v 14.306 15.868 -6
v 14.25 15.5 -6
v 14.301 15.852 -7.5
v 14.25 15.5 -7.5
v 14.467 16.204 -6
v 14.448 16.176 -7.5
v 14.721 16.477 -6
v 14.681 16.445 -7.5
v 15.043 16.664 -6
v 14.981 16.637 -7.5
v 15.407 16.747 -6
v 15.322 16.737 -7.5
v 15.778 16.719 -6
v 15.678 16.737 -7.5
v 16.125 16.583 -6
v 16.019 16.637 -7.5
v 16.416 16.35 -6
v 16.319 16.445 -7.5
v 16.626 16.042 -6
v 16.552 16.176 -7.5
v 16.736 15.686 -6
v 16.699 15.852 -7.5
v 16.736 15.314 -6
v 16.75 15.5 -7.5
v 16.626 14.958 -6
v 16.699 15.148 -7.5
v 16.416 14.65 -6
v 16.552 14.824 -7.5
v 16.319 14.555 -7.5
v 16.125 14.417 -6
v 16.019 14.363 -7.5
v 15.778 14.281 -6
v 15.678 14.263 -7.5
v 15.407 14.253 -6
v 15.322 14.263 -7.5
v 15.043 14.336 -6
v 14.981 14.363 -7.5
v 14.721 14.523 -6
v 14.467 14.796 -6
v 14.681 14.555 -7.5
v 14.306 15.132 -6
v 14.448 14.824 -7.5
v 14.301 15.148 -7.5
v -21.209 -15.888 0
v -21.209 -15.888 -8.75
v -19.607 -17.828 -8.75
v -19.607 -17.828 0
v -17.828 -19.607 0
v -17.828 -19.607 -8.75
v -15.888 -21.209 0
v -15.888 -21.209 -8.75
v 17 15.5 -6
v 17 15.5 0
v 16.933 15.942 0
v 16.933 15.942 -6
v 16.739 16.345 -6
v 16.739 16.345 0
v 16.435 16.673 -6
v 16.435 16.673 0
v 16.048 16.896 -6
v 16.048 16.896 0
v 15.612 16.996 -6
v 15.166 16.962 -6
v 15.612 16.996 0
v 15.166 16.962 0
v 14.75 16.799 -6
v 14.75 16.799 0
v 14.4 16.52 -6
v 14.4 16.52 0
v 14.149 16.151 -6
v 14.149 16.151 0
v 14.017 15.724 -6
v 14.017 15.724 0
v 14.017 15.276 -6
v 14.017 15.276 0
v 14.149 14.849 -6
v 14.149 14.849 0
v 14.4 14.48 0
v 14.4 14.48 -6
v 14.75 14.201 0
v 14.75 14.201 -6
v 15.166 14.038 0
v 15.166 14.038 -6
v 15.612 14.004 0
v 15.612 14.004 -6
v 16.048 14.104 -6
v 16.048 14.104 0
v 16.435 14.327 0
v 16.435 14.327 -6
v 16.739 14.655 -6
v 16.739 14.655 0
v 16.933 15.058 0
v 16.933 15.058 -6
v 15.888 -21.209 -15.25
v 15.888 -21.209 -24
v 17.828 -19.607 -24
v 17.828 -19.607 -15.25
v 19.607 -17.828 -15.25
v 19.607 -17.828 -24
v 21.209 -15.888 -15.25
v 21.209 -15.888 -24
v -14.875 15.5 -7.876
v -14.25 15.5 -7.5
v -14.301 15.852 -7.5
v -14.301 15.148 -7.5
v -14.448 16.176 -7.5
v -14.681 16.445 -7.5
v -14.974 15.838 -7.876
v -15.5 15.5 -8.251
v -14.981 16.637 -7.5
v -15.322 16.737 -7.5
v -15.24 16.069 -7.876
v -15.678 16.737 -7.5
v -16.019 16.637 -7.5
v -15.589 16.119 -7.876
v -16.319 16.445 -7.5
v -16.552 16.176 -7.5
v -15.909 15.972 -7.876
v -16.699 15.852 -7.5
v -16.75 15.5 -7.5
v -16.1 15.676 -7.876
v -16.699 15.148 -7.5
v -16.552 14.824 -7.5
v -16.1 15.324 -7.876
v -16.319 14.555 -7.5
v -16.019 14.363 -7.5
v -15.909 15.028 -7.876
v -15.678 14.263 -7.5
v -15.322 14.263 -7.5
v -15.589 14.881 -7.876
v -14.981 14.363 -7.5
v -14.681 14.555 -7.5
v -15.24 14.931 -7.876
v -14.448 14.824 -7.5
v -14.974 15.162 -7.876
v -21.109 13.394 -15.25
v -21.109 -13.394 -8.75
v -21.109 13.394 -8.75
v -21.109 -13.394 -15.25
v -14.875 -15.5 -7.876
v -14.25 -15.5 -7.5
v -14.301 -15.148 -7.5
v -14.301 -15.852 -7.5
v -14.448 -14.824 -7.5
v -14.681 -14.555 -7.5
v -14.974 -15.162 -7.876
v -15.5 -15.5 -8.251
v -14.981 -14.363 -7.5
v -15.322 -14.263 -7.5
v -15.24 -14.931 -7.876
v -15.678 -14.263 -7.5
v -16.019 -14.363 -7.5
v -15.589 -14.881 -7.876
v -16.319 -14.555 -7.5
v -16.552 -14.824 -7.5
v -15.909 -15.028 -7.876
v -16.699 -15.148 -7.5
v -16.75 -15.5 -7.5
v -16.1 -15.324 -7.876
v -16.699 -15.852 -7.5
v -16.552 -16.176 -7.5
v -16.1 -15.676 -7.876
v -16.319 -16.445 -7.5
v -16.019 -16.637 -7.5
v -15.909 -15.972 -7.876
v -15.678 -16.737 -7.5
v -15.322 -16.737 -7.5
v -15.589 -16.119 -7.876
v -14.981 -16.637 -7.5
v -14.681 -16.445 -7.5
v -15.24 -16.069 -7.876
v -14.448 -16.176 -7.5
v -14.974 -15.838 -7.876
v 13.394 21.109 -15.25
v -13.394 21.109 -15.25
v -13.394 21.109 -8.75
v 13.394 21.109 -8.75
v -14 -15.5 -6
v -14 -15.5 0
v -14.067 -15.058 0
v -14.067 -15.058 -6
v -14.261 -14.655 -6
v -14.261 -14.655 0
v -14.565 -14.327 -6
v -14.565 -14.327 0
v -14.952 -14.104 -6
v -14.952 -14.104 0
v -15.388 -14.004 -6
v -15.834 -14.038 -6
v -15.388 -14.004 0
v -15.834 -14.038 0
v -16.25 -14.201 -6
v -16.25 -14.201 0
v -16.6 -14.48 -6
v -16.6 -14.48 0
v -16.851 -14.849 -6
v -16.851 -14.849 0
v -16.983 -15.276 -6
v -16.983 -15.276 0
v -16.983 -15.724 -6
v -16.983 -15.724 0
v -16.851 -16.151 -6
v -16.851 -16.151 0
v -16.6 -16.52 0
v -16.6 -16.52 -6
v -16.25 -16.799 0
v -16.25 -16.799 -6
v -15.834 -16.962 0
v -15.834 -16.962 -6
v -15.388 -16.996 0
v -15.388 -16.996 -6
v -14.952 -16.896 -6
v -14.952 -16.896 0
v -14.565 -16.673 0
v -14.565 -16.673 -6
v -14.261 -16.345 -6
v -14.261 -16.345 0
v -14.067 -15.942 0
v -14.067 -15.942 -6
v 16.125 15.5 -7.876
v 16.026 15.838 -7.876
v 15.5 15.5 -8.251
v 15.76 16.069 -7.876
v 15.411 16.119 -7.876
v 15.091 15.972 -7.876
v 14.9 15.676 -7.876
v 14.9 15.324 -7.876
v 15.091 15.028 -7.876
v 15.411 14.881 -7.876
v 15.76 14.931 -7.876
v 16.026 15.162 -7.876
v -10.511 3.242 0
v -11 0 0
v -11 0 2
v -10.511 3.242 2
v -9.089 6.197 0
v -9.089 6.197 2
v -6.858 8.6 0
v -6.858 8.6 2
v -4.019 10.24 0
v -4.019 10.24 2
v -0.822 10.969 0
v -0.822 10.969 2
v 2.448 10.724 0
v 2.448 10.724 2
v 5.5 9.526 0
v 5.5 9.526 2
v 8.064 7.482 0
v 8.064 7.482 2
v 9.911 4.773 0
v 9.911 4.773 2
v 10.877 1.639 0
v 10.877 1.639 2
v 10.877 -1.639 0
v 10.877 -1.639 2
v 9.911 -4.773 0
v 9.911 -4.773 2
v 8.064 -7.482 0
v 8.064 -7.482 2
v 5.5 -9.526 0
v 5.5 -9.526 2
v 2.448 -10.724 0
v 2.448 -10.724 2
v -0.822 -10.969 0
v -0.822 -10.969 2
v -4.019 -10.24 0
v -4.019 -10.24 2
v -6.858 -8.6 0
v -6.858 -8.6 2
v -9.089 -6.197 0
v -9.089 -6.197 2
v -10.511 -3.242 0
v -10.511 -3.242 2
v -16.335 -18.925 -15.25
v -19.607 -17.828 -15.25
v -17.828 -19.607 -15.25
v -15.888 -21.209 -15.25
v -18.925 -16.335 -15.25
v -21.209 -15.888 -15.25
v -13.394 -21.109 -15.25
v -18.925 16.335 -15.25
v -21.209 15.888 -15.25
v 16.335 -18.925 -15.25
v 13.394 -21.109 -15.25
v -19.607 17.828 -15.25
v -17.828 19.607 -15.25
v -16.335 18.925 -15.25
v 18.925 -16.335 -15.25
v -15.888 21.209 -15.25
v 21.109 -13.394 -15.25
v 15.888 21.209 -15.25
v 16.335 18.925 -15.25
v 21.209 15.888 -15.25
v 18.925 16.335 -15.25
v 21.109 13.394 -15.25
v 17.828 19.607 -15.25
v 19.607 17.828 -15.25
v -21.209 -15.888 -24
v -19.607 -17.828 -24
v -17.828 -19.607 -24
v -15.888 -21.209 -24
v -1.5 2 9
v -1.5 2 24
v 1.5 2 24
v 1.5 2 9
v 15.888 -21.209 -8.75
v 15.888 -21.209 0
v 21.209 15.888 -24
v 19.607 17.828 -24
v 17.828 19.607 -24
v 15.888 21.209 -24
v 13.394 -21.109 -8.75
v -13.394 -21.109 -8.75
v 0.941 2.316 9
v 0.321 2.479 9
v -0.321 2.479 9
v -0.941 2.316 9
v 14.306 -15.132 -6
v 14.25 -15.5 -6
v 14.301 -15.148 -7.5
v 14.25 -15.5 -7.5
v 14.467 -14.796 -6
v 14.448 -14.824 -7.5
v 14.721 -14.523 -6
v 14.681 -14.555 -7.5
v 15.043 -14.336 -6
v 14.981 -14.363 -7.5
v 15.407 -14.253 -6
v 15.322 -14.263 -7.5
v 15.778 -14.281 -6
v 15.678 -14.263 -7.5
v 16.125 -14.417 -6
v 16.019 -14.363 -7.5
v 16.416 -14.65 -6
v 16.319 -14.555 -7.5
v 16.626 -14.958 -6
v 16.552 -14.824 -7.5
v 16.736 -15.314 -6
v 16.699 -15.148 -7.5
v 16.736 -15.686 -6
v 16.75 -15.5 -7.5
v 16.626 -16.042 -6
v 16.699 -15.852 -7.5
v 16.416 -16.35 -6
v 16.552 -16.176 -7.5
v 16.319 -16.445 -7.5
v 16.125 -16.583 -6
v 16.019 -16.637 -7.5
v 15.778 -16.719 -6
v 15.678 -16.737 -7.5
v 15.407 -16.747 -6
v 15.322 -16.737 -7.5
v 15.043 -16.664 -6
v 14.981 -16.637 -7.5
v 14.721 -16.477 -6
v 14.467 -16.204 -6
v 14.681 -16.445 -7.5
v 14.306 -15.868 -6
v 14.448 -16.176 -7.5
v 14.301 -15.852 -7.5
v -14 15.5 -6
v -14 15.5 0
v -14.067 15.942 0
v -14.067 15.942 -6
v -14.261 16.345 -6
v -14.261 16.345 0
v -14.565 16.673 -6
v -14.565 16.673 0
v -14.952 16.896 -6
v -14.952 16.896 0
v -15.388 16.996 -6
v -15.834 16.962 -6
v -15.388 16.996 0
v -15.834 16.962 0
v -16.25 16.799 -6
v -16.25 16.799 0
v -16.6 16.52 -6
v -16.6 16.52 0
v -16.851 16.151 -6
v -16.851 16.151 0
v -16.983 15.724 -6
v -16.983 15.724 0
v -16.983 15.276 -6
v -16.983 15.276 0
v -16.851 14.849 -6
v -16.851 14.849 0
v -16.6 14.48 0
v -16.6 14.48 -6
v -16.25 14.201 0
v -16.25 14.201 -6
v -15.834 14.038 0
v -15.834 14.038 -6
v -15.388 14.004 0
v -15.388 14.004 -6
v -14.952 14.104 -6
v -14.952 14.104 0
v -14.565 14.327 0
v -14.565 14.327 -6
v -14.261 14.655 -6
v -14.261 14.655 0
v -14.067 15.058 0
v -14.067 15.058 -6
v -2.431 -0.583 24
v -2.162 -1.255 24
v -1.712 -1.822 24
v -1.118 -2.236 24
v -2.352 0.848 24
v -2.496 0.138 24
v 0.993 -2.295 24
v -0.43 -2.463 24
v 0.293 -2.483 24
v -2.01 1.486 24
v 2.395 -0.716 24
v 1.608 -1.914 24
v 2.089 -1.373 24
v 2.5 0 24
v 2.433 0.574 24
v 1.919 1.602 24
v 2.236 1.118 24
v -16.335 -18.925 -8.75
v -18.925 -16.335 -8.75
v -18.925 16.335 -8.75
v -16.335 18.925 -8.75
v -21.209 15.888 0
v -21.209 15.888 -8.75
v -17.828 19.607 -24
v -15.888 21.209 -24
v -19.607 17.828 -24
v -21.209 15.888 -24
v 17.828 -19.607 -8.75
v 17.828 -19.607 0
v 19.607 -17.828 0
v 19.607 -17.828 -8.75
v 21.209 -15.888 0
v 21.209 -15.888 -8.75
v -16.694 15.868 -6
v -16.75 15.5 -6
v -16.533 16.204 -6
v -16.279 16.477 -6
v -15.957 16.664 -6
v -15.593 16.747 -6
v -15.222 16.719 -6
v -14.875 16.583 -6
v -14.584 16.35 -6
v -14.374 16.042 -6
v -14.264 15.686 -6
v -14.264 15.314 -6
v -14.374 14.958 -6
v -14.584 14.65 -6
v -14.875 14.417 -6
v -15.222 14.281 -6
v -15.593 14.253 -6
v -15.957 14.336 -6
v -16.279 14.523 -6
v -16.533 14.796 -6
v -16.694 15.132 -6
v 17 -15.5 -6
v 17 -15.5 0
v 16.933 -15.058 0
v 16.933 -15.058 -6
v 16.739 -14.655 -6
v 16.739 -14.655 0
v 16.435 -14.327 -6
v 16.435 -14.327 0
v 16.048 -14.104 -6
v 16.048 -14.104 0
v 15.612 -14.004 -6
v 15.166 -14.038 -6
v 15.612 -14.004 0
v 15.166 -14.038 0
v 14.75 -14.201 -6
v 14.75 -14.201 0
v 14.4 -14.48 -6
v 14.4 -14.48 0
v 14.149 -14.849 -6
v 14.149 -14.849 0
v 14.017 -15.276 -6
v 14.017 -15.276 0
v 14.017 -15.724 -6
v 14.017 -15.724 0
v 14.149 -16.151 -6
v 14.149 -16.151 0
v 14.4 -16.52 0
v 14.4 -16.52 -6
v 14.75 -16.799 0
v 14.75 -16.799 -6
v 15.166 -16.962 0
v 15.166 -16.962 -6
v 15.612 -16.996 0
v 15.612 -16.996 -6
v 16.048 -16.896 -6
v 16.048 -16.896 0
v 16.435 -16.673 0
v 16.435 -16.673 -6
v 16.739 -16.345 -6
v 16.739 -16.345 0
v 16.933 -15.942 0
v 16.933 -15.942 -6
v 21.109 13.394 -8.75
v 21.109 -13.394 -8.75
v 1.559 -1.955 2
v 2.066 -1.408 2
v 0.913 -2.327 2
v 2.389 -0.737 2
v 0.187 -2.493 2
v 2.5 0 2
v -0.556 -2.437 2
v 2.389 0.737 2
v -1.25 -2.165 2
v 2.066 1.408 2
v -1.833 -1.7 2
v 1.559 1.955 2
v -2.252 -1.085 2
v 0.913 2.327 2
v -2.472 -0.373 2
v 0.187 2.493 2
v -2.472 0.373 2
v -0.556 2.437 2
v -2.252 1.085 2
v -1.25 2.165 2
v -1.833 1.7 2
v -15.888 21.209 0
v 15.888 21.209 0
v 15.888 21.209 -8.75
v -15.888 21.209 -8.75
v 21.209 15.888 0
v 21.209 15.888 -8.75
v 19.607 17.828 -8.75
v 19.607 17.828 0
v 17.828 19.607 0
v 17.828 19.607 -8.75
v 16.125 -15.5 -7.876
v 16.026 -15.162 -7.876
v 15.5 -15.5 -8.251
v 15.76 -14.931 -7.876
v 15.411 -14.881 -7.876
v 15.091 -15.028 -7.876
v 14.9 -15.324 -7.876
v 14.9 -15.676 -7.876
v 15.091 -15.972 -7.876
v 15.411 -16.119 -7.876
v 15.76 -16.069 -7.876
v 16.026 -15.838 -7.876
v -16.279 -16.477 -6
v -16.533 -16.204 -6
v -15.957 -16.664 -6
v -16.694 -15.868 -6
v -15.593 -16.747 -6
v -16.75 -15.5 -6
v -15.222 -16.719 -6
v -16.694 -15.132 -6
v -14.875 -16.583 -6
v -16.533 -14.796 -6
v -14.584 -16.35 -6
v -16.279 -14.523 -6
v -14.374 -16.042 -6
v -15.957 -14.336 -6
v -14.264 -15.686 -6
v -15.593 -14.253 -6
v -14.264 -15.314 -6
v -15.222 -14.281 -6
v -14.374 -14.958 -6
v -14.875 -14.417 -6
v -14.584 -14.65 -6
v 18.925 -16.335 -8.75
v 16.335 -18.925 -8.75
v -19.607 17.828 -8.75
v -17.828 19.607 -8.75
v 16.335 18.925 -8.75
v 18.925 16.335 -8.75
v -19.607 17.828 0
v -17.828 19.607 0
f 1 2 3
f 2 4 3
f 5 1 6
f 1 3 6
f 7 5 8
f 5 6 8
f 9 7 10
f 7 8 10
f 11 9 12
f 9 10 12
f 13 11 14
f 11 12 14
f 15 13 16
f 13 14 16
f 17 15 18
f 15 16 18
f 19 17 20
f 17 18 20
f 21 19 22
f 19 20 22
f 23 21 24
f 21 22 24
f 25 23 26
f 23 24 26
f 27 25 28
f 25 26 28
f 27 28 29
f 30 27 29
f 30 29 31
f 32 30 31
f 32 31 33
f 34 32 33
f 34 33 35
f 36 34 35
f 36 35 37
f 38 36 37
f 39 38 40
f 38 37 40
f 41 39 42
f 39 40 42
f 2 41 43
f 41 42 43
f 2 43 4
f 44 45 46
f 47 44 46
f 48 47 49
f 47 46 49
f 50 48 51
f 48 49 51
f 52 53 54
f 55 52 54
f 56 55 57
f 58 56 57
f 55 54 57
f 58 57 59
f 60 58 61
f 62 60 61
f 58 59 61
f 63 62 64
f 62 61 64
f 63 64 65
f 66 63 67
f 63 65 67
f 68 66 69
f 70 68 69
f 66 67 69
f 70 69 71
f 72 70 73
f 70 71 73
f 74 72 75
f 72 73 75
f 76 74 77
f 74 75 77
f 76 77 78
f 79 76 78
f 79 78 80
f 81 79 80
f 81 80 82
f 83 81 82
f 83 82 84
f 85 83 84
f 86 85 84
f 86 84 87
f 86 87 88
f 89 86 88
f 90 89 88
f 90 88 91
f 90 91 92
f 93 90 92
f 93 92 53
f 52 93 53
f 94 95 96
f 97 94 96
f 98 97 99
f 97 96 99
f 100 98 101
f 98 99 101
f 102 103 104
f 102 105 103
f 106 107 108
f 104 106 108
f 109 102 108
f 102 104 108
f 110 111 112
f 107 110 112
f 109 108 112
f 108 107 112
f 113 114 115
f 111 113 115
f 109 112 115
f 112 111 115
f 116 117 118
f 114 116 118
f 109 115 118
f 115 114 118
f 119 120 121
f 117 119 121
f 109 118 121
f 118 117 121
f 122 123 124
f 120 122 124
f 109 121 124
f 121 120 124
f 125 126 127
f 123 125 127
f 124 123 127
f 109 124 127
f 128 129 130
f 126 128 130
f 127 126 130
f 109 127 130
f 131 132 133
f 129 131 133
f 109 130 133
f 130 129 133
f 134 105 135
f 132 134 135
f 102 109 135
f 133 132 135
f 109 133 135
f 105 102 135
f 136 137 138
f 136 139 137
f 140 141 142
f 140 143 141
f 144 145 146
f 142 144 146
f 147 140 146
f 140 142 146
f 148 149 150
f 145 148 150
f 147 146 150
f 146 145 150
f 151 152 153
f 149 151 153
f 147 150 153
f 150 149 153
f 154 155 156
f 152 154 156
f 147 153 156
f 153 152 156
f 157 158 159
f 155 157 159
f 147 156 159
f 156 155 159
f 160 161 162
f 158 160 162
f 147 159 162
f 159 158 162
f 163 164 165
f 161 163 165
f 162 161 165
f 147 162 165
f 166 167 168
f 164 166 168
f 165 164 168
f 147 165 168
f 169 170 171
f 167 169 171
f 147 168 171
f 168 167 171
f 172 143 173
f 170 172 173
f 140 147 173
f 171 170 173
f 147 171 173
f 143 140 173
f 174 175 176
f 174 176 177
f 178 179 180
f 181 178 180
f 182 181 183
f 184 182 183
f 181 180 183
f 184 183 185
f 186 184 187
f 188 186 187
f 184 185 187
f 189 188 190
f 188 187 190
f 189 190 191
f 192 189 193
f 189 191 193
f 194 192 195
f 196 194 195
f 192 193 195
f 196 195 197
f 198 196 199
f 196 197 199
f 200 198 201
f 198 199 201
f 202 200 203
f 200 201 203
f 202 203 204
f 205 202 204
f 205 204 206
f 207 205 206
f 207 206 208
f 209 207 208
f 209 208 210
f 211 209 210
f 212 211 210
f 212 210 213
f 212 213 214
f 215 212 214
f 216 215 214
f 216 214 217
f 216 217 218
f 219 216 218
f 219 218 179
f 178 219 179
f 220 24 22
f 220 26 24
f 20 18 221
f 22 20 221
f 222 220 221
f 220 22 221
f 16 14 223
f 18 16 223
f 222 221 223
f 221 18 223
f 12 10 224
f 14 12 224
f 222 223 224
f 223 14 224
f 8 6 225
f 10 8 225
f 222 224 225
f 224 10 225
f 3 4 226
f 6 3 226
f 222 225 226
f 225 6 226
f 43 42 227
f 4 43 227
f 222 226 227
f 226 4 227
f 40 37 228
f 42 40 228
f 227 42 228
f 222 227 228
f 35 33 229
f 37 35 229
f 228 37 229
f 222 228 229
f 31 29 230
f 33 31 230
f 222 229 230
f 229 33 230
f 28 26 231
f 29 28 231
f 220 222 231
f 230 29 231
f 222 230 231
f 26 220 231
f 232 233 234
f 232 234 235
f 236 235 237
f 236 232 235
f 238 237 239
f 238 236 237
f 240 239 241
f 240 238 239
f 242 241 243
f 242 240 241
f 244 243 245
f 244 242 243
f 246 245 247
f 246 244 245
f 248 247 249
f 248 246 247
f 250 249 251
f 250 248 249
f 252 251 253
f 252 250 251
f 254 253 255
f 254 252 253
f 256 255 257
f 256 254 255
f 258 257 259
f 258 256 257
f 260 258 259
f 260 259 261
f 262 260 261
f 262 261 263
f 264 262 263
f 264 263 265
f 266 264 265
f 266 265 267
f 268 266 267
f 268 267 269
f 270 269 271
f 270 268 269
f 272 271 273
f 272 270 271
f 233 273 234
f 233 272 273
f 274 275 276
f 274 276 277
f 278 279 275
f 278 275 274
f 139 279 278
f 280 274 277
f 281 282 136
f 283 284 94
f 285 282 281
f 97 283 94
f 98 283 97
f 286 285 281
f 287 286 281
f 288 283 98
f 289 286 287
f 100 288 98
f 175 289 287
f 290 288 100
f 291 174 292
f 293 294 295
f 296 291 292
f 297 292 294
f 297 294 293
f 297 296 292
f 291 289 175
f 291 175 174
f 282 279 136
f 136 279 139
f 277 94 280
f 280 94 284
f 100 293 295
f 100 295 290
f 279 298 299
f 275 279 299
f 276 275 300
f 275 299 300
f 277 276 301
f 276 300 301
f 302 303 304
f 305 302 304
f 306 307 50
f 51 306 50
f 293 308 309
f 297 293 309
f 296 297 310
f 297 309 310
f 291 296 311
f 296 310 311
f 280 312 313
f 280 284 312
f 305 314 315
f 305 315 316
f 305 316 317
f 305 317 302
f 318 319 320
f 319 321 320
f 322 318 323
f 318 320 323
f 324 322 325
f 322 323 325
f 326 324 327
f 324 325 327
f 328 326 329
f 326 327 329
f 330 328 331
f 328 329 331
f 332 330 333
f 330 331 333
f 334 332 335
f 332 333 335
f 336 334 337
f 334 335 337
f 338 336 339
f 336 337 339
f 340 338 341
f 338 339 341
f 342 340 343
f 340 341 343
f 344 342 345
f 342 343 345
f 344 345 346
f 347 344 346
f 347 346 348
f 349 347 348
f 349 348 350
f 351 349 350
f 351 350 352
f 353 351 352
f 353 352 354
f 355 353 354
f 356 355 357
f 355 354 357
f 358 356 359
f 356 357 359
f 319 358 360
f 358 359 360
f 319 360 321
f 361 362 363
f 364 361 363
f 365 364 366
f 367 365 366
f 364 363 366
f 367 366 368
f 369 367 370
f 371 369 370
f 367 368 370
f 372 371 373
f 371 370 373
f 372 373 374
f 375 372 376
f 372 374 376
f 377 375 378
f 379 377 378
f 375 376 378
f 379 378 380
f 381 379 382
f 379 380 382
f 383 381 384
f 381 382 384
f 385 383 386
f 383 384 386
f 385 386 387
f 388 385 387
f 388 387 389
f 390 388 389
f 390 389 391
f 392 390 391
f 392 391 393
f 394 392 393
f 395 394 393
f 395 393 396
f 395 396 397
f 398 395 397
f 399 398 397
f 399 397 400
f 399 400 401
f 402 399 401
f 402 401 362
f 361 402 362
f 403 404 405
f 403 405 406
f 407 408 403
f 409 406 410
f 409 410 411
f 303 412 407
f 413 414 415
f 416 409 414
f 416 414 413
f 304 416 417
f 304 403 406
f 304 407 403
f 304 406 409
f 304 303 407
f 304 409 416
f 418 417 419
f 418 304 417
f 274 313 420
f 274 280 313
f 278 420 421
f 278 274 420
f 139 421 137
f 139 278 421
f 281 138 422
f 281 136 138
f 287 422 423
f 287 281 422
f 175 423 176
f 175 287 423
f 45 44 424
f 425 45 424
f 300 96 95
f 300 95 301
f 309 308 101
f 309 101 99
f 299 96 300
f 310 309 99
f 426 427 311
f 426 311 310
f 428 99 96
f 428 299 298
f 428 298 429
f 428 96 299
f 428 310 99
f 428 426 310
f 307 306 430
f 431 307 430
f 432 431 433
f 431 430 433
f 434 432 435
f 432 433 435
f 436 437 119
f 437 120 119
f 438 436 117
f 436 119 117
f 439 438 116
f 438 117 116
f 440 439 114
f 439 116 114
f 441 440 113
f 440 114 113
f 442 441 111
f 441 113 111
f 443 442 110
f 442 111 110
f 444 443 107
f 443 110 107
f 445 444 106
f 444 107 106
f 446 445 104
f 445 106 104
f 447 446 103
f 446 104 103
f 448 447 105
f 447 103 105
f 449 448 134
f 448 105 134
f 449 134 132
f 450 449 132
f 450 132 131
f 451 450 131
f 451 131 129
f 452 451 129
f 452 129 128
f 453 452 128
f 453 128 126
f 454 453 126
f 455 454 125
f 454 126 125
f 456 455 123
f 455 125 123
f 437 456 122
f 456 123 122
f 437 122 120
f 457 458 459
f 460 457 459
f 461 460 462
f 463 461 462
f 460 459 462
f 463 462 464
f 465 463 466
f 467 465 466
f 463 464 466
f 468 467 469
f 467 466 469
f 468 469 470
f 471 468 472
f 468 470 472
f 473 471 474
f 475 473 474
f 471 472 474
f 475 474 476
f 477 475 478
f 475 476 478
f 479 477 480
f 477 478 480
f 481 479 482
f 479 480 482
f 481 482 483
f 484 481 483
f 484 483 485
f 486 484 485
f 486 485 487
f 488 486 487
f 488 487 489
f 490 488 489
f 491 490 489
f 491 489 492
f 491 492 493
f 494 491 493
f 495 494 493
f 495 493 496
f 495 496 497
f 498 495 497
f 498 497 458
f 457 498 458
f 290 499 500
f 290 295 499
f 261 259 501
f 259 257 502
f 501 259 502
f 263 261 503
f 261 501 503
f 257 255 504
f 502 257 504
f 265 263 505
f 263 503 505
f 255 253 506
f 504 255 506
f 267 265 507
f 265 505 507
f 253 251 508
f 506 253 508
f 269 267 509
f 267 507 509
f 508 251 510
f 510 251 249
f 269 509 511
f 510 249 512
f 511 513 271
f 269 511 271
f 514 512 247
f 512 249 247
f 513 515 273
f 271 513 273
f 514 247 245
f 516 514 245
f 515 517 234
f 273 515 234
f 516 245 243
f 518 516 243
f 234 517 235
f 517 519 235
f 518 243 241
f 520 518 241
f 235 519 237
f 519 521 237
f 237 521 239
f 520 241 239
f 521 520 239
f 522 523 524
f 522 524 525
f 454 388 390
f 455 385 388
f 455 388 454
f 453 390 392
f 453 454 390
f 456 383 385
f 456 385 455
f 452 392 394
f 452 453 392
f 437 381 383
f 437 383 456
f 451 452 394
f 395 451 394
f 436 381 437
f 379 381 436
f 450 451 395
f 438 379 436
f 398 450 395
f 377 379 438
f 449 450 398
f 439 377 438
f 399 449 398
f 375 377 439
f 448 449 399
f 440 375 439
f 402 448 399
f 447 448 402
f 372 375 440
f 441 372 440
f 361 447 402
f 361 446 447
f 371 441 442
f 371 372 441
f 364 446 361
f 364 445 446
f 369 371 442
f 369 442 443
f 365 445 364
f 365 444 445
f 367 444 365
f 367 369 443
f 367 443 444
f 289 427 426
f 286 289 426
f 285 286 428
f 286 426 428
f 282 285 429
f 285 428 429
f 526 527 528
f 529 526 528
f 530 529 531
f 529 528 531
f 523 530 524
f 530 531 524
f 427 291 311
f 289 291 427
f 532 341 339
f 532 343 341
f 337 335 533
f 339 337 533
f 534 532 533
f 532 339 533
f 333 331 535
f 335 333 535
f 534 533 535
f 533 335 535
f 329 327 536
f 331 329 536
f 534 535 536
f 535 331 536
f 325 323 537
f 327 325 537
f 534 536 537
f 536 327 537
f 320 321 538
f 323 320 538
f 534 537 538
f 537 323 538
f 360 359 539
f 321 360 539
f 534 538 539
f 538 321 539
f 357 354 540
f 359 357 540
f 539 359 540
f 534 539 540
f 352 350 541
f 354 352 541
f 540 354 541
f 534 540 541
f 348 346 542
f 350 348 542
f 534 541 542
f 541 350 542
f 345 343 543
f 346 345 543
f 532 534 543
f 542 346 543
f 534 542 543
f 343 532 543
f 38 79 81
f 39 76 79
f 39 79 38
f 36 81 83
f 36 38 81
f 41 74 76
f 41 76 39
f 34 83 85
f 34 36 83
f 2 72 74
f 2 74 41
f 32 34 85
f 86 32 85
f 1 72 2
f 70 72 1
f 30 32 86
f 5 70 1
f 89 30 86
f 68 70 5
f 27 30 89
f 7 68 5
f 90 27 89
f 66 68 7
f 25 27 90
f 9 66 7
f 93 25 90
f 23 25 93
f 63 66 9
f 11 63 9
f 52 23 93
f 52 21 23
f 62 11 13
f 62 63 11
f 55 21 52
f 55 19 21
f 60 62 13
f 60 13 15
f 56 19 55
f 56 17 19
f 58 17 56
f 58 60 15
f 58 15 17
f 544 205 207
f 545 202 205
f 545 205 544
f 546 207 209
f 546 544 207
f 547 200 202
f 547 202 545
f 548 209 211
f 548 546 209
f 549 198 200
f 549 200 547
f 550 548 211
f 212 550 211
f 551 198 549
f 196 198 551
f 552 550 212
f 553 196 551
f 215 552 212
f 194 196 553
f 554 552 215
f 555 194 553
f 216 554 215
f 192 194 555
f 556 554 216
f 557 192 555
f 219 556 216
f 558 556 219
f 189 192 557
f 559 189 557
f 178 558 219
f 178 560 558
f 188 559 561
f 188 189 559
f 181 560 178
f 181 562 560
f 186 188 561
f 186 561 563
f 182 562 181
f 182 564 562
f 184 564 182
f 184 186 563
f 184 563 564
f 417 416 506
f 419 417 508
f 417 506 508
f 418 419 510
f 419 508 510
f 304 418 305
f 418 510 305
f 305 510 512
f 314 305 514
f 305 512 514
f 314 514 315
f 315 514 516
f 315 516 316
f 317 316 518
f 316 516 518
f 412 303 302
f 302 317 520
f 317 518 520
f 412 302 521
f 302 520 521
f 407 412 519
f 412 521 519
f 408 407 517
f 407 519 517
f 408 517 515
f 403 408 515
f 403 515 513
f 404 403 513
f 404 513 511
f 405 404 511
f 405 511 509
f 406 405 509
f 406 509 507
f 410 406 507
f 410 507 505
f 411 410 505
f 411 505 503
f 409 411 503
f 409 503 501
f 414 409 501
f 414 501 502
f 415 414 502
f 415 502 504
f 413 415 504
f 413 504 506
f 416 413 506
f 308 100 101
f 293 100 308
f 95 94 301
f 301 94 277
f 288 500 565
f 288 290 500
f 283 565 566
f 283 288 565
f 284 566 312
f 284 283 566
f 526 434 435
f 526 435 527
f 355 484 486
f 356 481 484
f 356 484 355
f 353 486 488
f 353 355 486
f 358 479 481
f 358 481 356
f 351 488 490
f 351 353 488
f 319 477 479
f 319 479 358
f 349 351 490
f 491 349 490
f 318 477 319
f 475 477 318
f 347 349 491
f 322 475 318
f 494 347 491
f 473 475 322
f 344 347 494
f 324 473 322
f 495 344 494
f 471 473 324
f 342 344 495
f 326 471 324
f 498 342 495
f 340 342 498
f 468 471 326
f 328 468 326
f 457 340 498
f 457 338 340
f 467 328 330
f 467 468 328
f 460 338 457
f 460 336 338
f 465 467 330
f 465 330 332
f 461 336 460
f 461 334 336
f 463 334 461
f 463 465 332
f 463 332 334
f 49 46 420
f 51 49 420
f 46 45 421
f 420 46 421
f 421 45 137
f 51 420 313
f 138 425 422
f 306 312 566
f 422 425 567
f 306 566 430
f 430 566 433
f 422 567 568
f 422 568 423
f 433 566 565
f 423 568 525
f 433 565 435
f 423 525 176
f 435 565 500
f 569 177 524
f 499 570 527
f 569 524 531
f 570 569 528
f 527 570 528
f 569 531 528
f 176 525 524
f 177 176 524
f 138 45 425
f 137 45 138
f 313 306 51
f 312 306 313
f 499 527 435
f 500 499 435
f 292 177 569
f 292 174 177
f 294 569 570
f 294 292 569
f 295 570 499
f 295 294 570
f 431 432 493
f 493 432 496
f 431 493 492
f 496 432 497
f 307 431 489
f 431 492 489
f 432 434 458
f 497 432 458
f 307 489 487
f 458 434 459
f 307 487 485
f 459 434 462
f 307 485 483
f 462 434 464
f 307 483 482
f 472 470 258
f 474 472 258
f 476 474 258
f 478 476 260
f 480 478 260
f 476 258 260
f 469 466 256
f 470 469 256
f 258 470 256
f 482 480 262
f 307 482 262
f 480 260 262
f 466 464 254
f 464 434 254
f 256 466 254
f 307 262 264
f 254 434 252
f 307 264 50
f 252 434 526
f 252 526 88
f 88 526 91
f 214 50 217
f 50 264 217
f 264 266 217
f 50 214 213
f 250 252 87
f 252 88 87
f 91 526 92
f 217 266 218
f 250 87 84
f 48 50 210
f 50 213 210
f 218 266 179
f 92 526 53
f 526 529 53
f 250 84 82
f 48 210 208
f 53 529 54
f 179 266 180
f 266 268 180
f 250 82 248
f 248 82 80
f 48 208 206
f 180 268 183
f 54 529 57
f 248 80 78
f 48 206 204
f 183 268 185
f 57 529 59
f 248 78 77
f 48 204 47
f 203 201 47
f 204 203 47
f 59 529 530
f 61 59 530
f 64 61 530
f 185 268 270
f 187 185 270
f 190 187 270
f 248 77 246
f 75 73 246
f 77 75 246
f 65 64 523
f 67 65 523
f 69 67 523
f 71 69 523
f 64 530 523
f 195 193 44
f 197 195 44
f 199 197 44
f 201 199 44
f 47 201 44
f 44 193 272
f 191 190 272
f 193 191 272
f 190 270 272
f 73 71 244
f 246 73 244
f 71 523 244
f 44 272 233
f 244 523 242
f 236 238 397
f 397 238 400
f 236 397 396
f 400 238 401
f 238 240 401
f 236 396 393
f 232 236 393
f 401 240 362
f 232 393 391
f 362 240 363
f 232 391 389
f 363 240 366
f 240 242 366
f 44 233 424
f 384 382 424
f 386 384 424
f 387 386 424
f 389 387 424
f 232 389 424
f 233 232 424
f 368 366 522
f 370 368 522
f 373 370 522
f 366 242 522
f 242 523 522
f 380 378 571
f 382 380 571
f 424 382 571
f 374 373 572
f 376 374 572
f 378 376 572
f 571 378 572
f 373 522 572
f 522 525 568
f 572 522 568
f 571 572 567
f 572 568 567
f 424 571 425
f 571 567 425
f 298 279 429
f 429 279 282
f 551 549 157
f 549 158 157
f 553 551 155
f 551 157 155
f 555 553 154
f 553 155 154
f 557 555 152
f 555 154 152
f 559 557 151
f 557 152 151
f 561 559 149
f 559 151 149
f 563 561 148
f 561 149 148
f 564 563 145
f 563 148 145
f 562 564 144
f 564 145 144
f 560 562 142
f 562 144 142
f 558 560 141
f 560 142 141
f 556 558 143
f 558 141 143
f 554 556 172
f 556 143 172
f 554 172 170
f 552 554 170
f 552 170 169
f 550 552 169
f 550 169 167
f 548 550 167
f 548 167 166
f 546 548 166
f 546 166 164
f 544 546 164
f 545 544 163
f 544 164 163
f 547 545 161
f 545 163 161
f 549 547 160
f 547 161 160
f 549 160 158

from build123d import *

# Parameters (mm, degrees)
SKETCH1_R                       = 2.5
BOSS_EXTRUDE1_DEPTH             = 24
SKETCH2_R                       = 11
BOSS_EXTRUDE2_DEPTH             = 2
SKETCH3_W                       = 42.418
SKETCH3_H                       = 42.418
BOSS_EXTRUDE3_DEPTH             = 24
CUT_EXTRUDE1_DEPTH              = 49
M3X0_5_TAPPED_HOLE1_D           = 2.5
M3X0_5_TAPPED_HOLE1_DEPTH       = 7.5
M3X0_5_TAPPED_HOLE1_CBORE_D     = 3
M3X0_5_TAPPED_HOLE1_CBORE_DEPTH = 6
M3X0_5_TAPPED_HOLE1_TIP         = 0.751075774
CUT_EXTRUDE2_DEPTH              = 15
CUT_EXTRUDE3_DEPTH              = 3.25
CUT_EXTRUDE3_DEPTH_BACK         = 3.25


with BuildPart() as part:
    # Sketch1 → Boss-Extrude1 (new body)
    with BuildSketch(Plane.XY):
        Circle(SKETCH1_R)
    extrude(amount=BOSS_EXTRUDE1_DEPTH)

    # Sketch2 → Boss-Extrude2 (add)
    with BuildSketch(Plane(origin=(0, 0, 0), x_dir=(-1, 0, 0), z_dir=(0, 0, -1))):
        Circle(SKETCH2_R)
    extrude(amount=-BOSS_EXTRUDE2_DEPTH)

    # Sketch3 → Boss-Extrude3 (add)
    with BuildSketch(Plane(origin=(0, 0, 0), x_dir=(-1, 0, 0), z_dir=(0, 0, -1))):
        Rectangle(SKETCH3_W, SKETCH3_H)
    extrude(amount=BOSS_EXTRUDE3_DEPTH)

    # Sketch4 → Cut-Extrude1 (cut, through all)
    with BuildSketch(Plane(origin=(0, 0, -24), x_dir=(-1, 0, 0), z_dir=(0, 0, -1))):
        with BuildLine():
            Line((-21.209, -15.887992919), (-21.209, -21.209))
            Line((-21.209, -21.209), (-15.887992919, -21.209))
            ThreePointArc((-15.887992919, -21.209), (-18.738329701, -18.738329701), (-21.209, -15.887992919))
        make_face()
        with BuildLine():
            Line((15.887992919, -21.209), (21.209, -21.209))
            Line((21.209, -21.209), (21.209, -15.887992919))
            ThreePointArc((21.209, -15.887992919), (18.738329701, -18.738329701), (15.887992919, -21.209))
        make_face()
        with BuildLine():
            Line((21.209, 15.887992919), (21.209, 21.209))
            Line((21.209, 21.209), (15.887992919, 21.209))
            ThreePointArc((15.887992919, 21.209), (18.738329701, 18.738329701), (21.209, 15.887992919))
        make_face()
        with BuildLine():
            Line((-15.887992919, 21.209), (-21.209, 21.209))
            Line((-21.209, 21.209), (-21.209, 15.887992919))
            ThreePointArc((-21.209, 15.887992919), (-18.738329701, 18.738329701), (-15.887992919, 21.209))
        make_face()
    extrude(amount=-CUT_EXTRUDE1_DEPTH, mode=Mode.SUBTRACT)

    # M3x0.5 Tapped Hole1
    with Locations(Plane.XY):
        with Locations((-15.5, 15.5), (-15.5, -15.5), (15.5, -15.5), (15.5, 15.5)):
            CounterBoreHole(M3X0_5_TAPPED_HOLE1_D / 2, M3X0_5_TAPPED_HOLE1_CBORE_D / 2, M3X0_5_TAPPED_HOLE1_CBORE_DEPTH, depth=M3X0_5_TAPPED_HOLE1_DEPTH)
            with Locations((0, 0, -(M3X0_5_TAPPED_HOLE1_DEPTH + M3X0_5_TAPPED_HOLE1_TIP / 2))):  # 118° drill point
                Cone(0, M3X0_5_TAPPED_HOLE1_D / 2, M3X0_5_TAPPED_HOLE1_TIP, mode=Mode.SUBTRACT)

    # Sketch7 → Cut-Extrude2 (cut)
    with BuildSketch(Plane.XY.offset(24)):
        with BuildLine():
            Line((-1.5, 2), (1.5, 2))
            ThreePointArc((1.5, 2), (0, 2.5), (-1.5, 2))
        make_face()
    extrude(amount=-CUT_EXTRUDE2_DEPTH, mode=Mode.SUBTRACT)

    # Sketch8 → Cut-Extrude3 (cut, two sides)
    with BuildSketch(Plane.XY.offset(-12)) as cut_extrude3_sk:
        with BuildLine():
            Line((15.887992919, 21.209), (-15.887992919, 21.209))
            ThreePointArc((-15.887992919, 21.209), (-18.738329701, 18.738329701), (-21.209, 15.887992919))
            Line((-21.209, 15.887992919), (-21.209, -15.887992919))
            ThreePointArc((-21.209, -15.887992919), (-18.738329701, -18.738329701), (-15.887992919, -21.209))
            Line((-15.887992919, -21.209), (15.887992919, -21.209))
            ThreePointArc((15.887992919, -21.209), (18.738329701, -18.738329701), (21.209, -15.887992919))
            Line((21.209, -15.887992919), (21.209, 15.887992919))
            ThreePointArc((21.209, 15.887992919), (18.738329701, 18.738329701), (15.887992919, 21.209))
        make_face()
        with BuildLine():
            Line((-13.394406258, 21.109), (13.394406258, 21.109))
            ThreePointArc((13.394406258, 21.109), (17.67766953, 17.67766953), (21.109, 13.394406258))
            Line((21.109, 13.394406258), (21.109, -13.394406258))
            ThreePointArc((21.109, -13.394406258), (17.67766953, -17.67766953), (13.394406258, -21.109))
            Line((13.394406258, -21.109), (-13.394406258, -21.109))
            ThreePointArc((-13.394406258, -21.109), (-17.67766953, -17.67766953), (-21.109, -13.394406258))
            Line((-21.109, -13.394406258), (-21.109, 13.394406258))
            ThreePointArc((-21.109, 13.394406258), (-17.67766953, 17.67766953), (-13.394406258, 21.109))
        make_face(mode=Mode.SUBTRACT)
    extrude(amount=CUT_EXTRUDE3_DEPTH, mode=Mode.SUBTRACT)
    extrude(cut_extrude3_sk.sketch, amount=-CUT_EXTRUDE3_DEPTH_BACK, mode=Mode.SUBTRACT)


solid = part.part
